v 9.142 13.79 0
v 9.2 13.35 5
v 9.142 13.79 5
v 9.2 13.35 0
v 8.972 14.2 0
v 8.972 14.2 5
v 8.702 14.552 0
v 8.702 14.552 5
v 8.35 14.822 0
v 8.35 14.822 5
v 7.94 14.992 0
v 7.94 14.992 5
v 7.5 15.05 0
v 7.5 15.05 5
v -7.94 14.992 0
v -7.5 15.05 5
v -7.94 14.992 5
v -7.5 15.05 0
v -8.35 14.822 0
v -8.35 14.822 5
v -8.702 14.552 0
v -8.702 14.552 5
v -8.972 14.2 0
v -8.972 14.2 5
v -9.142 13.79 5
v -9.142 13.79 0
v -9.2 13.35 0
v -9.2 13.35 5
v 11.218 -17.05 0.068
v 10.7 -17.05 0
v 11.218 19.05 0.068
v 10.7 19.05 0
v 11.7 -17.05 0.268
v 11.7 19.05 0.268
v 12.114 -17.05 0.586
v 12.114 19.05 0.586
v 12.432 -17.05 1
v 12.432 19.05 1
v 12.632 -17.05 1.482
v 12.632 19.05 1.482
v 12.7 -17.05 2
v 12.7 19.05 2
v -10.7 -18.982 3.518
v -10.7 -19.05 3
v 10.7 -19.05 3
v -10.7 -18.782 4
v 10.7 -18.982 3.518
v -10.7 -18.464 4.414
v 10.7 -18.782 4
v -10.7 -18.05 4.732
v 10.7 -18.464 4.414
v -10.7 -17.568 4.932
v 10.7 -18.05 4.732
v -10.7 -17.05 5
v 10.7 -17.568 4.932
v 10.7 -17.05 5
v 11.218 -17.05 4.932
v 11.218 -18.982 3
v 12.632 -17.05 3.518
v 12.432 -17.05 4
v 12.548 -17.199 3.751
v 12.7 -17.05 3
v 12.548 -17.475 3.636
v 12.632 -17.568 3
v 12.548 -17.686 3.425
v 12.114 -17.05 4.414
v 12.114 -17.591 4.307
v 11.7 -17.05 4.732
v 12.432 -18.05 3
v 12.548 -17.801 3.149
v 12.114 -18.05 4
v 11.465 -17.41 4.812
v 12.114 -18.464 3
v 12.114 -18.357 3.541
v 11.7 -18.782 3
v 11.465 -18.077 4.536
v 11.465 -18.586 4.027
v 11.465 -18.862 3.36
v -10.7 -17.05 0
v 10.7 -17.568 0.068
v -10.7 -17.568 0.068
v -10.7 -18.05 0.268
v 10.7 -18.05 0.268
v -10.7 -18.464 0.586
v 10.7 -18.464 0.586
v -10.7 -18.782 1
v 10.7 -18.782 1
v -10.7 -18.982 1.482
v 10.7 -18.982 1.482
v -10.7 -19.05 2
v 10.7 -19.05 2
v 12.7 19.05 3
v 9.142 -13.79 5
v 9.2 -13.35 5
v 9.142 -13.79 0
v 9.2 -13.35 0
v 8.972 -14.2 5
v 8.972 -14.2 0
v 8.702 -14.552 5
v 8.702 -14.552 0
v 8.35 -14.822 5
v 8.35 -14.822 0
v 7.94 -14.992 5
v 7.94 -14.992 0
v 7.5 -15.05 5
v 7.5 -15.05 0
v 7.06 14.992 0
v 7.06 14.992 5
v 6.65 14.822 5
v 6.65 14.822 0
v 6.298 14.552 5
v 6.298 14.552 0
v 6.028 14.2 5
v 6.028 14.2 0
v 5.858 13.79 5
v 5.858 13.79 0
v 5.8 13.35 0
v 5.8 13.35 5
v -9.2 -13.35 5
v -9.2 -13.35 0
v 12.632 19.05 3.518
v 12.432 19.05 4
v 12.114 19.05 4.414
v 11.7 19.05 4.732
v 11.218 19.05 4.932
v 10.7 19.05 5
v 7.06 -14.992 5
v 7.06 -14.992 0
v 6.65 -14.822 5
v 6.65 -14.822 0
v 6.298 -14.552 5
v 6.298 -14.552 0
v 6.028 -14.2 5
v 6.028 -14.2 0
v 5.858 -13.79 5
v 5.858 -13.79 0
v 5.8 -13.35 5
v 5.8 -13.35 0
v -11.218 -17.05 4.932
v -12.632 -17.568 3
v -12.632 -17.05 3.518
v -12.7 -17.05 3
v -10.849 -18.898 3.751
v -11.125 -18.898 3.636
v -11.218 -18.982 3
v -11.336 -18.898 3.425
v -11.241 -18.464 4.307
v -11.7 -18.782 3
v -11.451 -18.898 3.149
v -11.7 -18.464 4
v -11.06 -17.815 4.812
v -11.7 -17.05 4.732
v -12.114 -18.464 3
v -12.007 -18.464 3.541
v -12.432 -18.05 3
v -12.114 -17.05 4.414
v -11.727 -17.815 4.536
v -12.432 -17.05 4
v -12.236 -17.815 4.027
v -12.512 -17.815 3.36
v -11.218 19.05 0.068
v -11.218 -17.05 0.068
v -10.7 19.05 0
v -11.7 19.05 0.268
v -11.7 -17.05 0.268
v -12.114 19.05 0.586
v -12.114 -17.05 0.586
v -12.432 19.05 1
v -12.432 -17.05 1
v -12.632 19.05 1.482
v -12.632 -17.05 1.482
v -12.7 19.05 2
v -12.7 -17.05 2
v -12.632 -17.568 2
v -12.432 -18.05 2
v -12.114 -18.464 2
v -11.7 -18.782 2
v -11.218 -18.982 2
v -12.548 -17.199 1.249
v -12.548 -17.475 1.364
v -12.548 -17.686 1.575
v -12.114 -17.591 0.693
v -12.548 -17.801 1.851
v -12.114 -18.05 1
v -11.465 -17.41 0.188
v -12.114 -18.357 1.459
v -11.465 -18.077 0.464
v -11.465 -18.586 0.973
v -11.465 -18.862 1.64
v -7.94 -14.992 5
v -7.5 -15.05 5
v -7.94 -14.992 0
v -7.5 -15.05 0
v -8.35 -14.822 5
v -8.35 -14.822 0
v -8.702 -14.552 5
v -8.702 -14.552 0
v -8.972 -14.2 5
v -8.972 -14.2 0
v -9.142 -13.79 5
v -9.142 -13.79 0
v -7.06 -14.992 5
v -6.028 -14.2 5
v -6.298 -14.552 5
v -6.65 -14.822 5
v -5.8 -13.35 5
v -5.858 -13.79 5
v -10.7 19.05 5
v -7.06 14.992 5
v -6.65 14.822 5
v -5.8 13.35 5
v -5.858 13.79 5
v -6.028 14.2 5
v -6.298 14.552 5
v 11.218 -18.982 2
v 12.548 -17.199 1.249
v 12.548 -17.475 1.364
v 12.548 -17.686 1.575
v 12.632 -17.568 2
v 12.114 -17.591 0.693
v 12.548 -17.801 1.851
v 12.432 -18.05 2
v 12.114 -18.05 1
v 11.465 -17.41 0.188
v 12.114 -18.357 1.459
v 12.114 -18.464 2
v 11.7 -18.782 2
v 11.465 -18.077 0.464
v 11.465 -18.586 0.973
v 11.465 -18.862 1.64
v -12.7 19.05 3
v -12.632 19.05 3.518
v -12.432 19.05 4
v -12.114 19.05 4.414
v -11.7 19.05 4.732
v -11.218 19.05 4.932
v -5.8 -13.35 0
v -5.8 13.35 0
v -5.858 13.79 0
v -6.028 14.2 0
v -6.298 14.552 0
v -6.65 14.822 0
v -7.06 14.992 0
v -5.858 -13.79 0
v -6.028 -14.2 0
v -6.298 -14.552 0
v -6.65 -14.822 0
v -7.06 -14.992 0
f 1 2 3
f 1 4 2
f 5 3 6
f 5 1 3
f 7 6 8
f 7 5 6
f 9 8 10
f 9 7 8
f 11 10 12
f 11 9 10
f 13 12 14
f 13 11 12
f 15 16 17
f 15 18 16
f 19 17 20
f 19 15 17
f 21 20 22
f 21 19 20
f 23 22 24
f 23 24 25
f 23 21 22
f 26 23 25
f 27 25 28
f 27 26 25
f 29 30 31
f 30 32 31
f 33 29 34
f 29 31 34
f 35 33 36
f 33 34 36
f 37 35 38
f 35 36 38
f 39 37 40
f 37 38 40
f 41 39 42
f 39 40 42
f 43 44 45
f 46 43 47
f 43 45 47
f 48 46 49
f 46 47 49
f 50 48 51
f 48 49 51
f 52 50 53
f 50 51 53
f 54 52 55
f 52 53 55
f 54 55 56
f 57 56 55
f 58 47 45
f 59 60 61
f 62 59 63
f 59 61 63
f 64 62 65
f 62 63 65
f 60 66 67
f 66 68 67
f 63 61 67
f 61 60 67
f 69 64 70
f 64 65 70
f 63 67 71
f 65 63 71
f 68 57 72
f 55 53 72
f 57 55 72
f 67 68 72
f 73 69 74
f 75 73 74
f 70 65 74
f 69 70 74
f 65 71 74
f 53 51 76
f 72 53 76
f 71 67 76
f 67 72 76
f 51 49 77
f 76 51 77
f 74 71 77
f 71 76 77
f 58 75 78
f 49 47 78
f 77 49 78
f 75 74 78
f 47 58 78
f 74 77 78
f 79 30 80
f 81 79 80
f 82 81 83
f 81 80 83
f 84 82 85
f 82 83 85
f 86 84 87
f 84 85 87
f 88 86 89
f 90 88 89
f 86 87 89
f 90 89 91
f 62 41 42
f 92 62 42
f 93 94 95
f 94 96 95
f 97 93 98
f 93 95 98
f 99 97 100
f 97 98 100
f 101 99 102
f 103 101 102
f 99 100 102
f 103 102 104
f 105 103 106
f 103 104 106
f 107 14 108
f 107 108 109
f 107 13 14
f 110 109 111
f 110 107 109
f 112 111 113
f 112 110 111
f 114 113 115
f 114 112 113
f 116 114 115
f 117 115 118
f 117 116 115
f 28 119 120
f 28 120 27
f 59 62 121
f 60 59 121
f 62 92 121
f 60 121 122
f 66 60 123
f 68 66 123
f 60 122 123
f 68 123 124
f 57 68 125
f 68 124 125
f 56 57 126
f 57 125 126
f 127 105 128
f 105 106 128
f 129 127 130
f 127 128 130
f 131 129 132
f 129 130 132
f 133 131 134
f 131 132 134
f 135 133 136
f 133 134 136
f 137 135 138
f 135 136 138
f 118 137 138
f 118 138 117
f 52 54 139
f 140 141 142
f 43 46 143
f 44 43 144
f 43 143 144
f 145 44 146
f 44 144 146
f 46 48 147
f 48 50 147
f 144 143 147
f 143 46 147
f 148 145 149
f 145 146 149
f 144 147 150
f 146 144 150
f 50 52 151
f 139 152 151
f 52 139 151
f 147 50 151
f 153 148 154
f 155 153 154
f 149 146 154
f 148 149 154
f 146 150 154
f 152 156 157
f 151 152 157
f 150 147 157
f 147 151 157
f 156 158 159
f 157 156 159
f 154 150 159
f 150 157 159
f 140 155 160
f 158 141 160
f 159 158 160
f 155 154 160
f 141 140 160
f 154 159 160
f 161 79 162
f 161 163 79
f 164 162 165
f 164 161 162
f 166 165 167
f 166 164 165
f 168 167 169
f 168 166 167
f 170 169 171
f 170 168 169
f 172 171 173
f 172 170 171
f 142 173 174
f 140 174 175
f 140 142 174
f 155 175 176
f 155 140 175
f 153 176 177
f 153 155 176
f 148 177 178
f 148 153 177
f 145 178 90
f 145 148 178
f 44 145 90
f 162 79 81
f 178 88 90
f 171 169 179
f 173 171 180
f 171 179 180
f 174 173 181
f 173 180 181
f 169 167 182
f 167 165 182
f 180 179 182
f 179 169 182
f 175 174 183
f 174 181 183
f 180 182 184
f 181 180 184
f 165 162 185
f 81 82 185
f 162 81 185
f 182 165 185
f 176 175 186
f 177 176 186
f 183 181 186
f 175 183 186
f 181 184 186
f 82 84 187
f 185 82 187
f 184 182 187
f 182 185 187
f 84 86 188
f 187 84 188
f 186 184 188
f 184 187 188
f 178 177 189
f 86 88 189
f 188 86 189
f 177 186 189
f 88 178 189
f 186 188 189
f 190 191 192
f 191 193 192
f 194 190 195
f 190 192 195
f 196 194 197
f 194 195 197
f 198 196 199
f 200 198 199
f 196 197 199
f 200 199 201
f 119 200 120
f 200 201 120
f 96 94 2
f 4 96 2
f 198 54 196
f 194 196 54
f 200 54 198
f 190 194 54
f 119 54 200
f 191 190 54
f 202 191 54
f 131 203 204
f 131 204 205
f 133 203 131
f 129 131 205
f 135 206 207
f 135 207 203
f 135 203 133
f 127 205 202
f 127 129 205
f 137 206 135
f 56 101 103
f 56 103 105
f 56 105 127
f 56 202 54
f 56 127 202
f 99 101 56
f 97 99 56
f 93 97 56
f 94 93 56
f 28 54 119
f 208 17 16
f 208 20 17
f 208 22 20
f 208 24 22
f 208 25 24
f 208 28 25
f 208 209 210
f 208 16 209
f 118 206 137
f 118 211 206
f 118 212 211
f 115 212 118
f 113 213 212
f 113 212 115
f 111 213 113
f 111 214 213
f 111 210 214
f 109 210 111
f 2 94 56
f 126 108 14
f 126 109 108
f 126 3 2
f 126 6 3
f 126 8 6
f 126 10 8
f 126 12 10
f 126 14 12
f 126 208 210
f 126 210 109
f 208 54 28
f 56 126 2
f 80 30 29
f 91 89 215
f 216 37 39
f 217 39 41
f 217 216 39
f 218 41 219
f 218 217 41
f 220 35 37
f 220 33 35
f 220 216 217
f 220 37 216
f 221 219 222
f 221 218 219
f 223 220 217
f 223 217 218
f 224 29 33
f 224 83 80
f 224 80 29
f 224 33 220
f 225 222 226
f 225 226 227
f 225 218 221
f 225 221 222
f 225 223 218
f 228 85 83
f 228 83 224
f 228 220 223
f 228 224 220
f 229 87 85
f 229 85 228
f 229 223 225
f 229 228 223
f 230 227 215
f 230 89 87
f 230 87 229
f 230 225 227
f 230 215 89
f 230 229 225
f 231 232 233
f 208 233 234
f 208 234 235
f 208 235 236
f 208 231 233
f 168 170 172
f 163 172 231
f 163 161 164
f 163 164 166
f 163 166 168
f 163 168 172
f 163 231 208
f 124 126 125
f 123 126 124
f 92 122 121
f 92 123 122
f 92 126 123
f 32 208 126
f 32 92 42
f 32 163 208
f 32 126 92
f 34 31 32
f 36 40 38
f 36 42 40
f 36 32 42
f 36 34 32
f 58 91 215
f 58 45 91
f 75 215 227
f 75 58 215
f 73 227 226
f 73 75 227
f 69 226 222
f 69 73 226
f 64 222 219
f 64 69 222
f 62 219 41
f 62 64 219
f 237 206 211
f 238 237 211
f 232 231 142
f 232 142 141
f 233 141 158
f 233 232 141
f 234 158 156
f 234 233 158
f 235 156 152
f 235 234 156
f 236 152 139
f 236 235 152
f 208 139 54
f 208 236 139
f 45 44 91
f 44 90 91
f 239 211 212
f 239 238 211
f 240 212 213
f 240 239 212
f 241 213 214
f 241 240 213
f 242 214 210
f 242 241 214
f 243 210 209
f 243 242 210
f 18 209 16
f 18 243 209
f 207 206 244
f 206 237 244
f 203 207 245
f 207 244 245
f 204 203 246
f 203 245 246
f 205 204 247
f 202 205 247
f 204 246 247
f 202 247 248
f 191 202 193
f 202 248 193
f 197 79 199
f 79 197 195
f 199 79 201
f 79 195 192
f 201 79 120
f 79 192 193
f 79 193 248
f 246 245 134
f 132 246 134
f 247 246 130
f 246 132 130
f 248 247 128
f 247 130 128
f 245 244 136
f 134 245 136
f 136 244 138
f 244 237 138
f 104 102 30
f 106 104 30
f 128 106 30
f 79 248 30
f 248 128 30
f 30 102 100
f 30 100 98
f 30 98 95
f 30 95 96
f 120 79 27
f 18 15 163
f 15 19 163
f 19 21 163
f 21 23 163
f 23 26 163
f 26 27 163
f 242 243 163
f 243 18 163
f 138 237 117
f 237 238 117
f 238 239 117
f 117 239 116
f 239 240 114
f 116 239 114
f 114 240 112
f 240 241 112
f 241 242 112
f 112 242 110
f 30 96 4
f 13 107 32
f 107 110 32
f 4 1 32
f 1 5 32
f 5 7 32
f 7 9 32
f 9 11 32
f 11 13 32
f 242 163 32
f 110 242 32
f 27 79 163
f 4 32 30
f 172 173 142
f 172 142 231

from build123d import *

# Parameters (mm, degrees)
SKETCH1_W           = 25.4
SKETCH1_H           = 38.1
BOSS_EXTRUDE1_DEPTH = 5
SKETCH2_W           = 3.4
SKETCH2_H           = 30.1
CUT_EXTRUDE1_DEPTH  = 24.434856518
FILLET1_R           = 1.7
FILLET2_R           = 1.7
FILLET3_R           = 1.7
FILLET4_R           = 1.7
FILLET5_R           = 2


with BuildPart() as part:
    # Sketch1 → Boss-Extrude1 (new body)
    with BuildSketch(Plane.XY):
        Rectangle(SKETCH1_W, SKETCH1_H)
    extrude(amount=BOSS_EXTRUDE1_DEPTH)

    # Sketch2 → Cut-Extrude1 (cut, through all)
    with BuildSketch(Plane.XY.offset(5)):
        with Locations((7.5, 0)):
            Rectangle(SKETCH2_W, SKETCH2_H)
        with Locations((-7.5, 0)):
            Rectangle(SKETCH2_W, SKETCH2_H)
    extrude(amount=-CUT_EXTRUDE1_DEPTH, mode=Mode.SUBTRACT)

    # Fillet1
    fillet1_edges = [part.edges().sort_by_distance(p)[0] for p in [
        (-5.8, 15.05, 2.5),
        (-9.2, 15.05, 2.5),
    ]]
    fillet(fillet1_edges, radius=FILLET1_R - 0.0001)  # a hair under: the kernel refuses the full size

    # Fillet2
    fillet2_edges = [part.edges().sort_by_distance(p)[0] for p in [
        (-5.8, -15.05, 2.5),
        (-9.2, -15.05, 2.5),
    ]]
    fillet(fillet2_edges, radius=FILLET2_R - 0.0001)  # a hair under: the kernel refuses the full size

    # Fillet3
    fillet3_edges = [part.edges().sort_by_distance(p)[0] for p in [
        (9.2, 15.05, 2.5),
        (5.8, 15.05, 2.5),
    ]]
    fillet(fillet3_edges, radius=FILLET3_R - 0.0001)  # a hair under: the kernel refuses the full size

    # Fillet4
    fillet4_edges = [part.edges().sort_by_distance(p)[0] for p in [
        (9.2, -15.05, 2.5),
        (5.8, -15.05, 2.5),
    ]]
    fillet(fillet4_edges, radius=FILLET4_R - 0.0001)  # a hair under: the kernel refuses the full size

    # Fillet5
    fillet5_edges = [part.edges().sort_by_distance(p)[0] for p in [
        (-12.7, 0, 5),
        (0, -19.05, 5),
        (12.7, 0, 5),
        (0, -19.05, 0),
        (-12.7, 0, 0),
        (12.7, 0, 0),
        (12.7, -19.05, 2.5),
        (-12.7, -19.05, 2.5),
    ]]
    fillet(fillet5_edges, radius=FILLET5_R)


solid = part.part
